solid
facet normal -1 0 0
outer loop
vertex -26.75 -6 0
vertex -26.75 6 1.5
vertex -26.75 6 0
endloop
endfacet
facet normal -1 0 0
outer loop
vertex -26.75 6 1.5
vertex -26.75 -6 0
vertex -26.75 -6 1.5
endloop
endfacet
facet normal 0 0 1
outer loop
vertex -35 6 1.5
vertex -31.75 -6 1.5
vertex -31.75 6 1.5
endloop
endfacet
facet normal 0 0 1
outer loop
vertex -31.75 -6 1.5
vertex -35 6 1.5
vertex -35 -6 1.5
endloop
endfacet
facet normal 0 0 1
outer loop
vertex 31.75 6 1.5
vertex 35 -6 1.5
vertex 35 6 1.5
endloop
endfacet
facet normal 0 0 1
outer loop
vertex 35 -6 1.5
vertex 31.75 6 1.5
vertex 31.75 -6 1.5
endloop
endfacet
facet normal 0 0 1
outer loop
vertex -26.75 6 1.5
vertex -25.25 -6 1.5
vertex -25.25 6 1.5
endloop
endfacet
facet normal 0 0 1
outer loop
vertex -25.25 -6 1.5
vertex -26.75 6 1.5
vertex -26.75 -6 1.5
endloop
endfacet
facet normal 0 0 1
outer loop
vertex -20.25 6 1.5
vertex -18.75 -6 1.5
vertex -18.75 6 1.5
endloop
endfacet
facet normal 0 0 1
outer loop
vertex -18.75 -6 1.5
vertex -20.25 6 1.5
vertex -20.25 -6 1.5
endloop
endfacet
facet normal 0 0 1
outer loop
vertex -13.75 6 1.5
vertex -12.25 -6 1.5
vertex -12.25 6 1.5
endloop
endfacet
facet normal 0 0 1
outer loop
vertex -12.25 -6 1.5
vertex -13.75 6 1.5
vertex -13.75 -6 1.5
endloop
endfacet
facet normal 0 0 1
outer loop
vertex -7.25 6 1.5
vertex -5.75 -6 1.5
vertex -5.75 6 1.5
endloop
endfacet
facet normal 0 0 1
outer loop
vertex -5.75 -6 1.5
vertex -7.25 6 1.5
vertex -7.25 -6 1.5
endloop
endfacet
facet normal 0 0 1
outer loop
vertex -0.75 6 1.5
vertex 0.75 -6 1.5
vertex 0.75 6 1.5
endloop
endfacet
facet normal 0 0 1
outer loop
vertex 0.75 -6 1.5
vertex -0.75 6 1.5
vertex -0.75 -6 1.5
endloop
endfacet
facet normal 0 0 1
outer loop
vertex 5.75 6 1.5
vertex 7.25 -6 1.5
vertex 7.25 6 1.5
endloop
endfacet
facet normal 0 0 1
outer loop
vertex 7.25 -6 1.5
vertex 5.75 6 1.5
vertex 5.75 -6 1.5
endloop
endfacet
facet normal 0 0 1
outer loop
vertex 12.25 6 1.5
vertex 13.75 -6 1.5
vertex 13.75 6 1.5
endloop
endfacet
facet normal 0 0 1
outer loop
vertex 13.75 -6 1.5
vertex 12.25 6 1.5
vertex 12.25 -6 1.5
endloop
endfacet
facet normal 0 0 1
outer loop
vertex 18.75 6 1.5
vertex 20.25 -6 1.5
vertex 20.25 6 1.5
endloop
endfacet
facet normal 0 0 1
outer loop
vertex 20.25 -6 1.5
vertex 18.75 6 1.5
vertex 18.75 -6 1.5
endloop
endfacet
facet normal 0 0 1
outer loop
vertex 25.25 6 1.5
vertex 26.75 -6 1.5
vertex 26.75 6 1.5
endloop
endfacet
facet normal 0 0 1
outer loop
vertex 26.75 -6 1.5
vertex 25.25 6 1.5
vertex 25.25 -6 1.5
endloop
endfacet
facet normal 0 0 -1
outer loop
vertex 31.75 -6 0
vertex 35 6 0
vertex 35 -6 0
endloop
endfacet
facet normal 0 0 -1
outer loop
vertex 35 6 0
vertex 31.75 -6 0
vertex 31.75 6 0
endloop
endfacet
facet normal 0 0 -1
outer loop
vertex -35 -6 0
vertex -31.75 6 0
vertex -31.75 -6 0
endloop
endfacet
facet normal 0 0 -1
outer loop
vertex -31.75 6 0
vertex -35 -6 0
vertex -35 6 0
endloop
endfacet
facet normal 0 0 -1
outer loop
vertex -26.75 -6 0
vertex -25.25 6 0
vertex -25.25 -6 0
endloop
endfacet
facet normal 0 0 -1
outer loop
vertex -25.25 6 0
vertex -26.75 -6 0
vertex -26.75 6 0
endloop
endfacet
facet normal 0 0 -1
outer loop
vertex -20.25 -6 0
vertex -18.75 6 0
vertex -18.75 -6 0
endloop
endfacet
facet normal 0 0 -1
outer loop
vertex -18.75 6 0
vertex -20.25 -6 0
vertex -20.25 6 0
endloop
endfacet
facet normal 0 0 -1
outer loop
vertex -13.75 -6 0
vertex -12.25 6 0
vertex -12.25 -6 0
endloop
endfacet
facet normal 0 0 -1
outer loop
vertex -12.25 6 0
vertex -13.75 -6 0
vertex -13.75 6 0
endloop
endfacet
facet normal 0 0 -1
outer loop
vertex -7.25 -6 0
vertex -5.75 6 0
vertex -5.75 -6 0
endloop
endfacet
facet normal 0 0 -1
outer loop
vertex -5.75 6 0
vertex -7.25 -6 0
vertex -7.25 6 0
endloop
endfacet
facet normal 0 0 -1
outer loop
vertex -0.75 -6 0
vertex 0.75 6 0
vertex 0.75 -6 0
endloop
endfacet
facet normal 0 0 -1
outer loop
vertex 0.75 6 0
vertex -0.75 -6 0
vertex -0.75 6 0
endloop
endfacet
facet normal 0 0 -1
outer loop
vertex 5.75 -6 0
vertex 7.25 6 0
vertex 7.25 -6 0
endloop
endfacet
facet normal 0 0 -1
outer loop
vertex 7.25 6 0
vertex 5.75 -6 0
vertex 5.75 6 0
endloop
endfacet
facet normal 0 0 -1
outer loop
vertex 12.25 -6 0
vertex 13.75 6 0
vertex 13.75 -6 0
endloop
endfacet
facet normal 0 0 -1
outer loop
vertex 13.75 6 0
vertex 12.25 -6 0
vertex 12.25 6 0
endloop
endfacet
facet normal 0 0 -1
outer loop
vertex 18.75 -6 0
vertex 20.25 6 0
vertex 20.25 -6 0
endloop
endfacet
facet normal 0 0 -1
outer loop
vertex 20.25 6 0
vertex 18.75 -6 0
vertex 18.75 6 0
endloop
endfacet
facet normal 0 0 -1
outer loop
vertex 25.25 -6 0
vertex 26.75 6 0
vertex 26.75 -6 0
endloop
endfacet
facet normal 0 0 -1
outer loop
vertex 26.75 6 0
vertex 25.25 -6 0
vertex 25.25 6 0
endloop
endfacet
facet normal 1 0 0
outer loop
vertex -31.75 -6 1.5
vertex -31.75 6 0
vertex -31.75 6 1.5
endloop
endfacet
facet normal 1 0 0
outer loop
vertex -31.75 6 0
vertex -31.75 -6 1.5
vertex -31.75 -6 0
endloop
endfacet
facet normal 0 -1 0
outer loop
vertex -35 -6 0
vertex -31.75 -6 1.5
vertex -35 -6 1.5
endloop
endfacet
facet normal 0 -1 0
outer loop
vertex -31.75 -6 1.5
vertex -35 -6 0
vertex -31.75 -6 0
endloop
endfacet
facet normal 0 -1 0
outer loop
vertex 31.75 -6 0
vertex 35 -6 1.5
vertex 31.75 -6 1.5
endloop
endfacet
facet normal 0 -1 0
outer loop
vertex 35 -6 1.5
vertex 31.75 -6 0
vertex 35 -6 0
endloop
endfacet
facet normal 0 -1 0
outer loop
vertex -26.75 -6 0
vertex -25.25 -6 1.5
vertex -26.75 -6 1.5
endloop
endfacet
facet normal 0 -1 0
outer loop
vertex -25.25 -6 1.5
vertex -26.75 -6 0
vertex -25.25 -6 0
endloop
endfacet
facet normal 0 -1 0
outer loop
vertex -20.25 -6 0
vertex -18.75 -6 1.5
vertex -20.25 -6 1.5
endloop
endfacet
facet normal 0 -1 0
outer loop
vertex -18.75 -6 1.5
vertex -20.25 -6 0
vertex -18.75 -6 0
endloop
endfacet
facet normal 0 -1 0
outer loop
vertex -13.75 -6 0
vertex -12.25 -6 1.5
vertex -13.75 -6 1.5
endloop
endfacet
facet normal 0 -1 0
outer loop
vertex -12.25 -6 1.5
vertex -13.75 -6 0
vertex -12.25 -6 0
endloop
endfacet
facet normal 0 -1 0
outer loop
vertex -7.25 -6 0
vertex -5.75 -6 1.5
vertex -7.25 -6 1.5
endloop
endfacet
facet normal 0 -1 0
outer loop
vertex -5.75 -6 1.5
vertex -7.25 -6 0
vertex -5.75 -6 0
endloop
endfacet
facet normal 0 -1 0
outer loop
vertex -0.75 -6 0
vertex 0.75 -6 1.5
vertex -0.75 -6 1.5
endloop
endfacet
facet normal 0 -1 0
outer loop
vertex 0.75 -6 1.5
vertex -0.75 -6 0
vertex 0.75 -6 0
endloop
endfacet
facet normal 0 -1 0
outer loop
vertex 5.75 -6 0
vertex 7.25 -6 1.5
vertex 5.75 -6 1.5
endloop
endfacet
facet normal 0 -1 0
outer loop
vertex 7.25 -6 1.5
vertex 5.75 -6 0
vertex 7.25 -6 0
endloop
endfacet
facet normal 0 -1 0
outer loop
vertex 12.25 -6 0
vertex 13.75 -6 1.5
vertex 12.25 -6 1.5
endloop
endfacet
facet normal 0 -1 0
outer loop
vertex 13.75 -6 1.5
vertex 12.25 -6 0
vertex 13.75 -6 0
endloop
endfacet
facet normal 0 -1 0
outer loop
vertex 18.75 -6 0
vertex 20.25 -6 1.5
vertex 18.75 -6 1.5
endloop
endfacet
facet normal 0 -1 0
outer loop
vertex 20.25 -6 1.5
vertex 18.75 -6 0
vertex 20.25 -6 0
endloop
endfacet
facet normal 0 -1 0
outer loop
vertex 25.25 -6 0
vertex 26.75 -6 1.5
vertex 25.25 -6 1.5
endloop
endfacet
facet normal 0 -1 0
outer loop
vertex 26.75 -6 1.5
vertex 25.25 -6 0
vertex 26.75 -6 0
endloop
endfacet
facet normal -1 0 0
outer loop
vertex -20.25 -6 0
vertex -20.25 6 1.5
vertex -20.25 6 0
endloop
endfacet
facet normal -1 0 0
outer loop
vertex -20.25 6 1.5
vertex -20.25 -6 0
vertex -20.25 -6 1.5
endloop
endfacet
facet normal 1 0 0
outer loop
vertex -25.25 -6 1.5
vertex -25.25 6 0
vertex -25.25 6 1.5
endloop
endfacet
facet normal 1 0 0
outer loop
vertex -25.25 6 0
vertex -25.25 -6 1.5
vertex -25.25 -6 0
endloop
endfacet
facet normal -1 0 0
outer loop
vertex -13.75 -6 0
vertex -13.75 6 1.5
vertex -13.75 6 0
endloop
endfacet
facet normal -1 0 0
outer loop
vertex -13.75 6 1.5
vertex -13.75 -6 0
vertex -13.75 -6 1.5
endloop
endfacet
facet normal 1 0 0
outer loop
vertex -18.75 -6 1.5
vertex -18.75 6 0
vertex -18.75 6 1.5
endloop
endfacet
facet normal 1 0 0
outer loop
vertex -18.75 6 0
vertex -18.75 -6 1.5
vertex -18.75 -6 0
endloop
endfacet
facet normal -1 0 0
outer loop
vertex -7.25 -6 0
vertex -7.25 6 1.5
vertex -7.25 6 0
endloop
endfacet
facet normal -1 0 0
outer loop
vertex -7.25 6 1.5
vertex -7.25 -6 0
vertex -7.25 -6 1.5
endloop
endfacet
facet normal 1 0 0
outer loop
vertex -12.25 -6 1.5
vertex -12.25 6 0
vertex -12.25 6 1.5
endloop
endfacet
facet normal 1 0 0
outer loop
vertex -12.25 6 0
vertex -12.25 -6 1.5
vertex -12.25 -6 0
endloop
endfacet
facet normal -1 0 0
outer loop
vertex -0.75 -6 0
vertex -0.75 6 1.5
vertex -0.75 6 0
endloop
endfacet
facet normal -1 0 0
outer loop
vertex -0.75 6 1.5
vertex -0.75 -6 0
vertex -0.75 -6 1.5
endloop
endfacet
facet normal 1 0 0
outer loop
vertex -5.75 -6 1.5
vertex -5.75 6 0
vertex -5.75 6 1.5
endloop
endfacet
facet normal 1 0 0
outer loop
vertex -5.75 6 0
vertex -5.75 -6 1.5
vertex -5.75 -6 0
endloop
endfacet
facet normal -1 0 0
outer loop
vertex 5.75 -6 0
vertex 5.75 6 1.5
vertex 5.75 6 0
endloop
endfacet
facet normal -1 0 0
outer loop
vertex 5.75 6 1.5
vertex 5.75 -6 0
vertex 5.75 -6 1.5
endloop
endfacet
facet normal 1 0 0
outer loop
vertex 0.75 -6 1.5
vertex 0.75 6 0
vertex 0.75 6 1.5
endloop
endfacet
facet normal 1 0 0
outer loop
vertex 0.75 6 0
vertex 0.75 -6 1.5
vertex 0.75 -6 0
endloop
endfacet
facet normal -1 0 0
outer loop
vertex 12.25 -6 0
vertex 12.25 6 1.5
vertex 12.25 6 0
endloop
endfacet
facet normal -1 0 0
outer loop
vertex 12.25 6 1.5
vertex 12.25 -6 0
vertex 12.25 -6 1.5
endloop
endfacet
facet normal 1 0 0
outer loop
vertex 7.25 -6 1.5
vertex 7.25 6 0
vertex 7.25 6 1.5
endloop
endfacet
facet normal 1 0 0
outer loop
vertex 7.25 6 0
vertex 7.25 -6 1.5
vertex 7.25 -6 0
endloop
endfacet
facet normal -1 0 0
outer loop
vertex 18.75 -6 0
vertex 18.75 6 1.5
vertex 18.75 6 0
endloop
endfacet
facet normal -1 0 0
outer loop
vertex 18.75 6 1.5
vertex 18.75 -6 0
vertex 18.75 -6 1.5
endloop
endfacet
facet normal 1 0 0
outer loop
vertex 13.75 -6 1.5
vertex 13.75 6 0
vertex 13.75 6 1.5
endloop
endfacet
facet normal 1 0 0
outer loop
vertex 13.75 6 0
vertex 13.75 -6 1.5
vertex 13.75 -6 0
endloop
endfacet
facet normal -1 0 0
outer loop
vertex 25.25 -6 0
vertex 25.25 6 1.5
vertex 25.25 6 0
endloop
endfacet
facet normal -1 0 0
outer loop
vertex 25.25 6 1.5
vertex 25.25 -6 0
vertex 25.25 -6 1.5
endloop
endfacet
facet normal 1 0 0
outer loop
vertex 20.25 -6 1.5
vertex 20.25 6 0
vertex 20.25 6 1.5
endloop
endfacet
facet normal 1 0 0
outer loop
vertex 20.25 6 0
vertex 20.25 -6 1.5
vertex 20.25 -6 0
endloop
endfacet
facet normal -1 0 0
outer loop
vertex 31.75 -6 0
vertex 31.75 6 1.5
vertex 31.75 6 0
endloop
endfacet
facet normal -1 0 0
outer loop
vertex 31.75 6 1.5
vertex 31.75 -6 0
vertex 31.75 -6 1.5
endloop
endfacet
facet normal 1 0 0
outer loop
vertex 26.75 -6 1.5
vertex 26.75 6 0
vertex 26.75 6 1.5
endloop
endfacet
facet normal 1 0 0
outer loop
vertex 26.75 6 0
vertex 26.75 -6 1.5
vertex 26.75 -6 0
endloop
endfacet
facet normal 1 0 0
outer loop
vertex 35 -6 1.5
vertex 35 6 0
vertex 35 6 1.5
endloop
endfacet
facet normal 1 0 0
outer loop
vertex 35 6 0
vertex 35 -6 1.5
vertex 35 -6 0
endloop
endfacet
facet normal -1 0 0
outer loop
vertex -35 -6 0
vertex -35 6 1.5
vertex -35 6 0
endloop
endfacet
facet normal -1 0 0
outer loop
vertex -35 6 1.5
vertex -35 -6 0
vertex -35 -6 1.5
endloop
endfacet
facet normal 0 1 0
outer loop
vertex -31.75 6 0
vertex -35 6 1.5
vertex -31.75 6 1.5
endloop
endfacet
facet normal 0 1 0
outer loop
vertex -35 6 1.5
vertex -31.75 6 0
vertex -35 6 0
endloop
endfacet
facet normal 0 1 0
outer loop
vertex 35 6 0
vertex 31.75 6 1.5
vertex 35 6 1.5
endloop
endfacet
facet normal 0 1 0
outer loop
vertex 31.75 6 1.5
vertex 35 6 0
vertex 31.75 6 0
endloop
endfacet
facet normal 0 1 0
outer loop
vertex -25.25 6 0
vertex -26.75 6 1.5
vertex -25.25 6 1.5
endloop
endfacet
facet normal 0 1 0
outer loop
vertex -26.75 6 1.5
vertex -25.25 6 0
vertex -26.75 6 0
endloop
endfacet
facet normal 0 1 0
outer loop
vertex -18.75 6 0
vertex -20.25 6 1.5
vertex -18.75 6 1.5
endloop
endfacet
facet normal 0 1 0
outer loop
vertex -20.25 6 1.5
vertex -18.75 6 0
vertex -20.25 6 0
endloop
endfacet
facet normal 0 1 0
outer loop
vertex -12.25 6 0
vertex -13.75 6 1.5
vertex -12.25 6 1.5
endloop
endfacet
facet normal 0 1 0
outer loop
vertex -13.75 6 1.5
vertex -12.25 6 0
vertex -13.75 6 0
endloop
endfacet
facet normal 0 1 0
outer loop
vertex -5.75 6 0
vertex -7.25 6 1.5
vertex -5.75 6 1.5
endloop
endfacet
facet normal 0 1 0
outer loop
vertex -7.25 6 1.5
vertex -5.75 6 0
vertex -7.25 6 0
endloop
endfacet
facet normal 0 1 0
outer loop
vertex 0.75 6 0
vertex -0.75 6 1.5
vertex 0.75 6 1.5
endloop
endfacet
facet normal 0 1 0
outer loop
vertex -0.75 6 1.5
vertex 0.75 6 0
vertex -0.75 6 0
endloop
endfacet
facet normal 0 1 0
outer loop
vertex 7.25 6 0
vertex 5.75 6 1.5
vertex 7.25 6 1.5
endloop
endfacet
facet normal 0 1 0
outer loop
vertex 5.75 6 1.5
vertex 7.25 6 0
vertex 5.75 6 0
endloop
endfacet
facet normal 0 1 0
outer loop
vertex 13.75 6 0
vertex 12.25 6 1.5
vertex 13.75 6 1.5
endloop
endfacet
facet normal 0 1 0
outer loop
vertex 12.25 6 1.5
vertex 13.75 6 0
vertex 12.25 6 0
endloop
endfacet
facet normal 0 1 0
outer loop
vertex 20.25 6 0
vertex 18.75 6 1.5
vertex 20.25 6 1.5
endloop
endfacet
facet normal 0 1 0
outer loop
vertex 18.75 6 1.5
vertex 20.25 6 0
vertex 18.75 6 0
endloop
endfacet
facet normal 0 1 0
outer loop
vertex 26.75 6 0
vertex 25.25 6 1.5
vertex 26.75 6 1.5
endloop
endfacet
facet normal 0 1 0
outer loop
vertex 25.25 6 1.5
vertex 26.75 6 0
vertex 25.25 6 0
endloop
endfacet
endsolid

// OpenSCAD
// 10-well comb for casting agarose gels
// Print orientation: flat on bed, teeth pointing down (-Y)

// ---- Dimensions (mm) ----
plate_t      = 1.5;   // plate thickness (Z)
spine_l      = 70;    // spine length (X)
spine_w      = 12;    // spine width (Y)
tooth_w      = 5.0;   // tooth width (X)
tooth_l      = 12;    // tooth length (Y)
tooth_count  = 10;    // number of teeth
gap          = 1.5;   // gap between teeth (X)
eps          = 0.5;   // cutter overshoot past faces (Z)

// ---- Derived ----
pitch   = tooth_w + gap;            // centre-to-centre spacing of teeth
x_start = -(tooth_count - 1) * pitch / 2; // first tooth centre (row centred on spine)

// ---- Model ----
difference() {
    // Flat plate with spine and teeth in +Y
    union() {
        // Spine (back bar)
        translate([-spine_l / 2, -spine_w / 2, 0])
            cube([spine_l, spine_w, plate_t]);

        // Teeth hanging from the long edge of the spine
        for (i = [0 : tooth_count - 1])
            translate([x_start + i * pitch - tooth_w / 2,
                       spine_w / 2 - tooth_l,
                       0])
                cube([tooth_w, tooth_l + eps, plate_t]);
    }

    // Cut out the 10 wells seen from above
    for (i = [0 : tooth_count - 1])
        translate([x_start + i * pitch - tooth_w / 2,
                   spine_w / 2 - tooth_l,
                   -eps])
            cube([tooth_w, tooth_l + 2 * eps, plate_t + 2 * eps]);
}
